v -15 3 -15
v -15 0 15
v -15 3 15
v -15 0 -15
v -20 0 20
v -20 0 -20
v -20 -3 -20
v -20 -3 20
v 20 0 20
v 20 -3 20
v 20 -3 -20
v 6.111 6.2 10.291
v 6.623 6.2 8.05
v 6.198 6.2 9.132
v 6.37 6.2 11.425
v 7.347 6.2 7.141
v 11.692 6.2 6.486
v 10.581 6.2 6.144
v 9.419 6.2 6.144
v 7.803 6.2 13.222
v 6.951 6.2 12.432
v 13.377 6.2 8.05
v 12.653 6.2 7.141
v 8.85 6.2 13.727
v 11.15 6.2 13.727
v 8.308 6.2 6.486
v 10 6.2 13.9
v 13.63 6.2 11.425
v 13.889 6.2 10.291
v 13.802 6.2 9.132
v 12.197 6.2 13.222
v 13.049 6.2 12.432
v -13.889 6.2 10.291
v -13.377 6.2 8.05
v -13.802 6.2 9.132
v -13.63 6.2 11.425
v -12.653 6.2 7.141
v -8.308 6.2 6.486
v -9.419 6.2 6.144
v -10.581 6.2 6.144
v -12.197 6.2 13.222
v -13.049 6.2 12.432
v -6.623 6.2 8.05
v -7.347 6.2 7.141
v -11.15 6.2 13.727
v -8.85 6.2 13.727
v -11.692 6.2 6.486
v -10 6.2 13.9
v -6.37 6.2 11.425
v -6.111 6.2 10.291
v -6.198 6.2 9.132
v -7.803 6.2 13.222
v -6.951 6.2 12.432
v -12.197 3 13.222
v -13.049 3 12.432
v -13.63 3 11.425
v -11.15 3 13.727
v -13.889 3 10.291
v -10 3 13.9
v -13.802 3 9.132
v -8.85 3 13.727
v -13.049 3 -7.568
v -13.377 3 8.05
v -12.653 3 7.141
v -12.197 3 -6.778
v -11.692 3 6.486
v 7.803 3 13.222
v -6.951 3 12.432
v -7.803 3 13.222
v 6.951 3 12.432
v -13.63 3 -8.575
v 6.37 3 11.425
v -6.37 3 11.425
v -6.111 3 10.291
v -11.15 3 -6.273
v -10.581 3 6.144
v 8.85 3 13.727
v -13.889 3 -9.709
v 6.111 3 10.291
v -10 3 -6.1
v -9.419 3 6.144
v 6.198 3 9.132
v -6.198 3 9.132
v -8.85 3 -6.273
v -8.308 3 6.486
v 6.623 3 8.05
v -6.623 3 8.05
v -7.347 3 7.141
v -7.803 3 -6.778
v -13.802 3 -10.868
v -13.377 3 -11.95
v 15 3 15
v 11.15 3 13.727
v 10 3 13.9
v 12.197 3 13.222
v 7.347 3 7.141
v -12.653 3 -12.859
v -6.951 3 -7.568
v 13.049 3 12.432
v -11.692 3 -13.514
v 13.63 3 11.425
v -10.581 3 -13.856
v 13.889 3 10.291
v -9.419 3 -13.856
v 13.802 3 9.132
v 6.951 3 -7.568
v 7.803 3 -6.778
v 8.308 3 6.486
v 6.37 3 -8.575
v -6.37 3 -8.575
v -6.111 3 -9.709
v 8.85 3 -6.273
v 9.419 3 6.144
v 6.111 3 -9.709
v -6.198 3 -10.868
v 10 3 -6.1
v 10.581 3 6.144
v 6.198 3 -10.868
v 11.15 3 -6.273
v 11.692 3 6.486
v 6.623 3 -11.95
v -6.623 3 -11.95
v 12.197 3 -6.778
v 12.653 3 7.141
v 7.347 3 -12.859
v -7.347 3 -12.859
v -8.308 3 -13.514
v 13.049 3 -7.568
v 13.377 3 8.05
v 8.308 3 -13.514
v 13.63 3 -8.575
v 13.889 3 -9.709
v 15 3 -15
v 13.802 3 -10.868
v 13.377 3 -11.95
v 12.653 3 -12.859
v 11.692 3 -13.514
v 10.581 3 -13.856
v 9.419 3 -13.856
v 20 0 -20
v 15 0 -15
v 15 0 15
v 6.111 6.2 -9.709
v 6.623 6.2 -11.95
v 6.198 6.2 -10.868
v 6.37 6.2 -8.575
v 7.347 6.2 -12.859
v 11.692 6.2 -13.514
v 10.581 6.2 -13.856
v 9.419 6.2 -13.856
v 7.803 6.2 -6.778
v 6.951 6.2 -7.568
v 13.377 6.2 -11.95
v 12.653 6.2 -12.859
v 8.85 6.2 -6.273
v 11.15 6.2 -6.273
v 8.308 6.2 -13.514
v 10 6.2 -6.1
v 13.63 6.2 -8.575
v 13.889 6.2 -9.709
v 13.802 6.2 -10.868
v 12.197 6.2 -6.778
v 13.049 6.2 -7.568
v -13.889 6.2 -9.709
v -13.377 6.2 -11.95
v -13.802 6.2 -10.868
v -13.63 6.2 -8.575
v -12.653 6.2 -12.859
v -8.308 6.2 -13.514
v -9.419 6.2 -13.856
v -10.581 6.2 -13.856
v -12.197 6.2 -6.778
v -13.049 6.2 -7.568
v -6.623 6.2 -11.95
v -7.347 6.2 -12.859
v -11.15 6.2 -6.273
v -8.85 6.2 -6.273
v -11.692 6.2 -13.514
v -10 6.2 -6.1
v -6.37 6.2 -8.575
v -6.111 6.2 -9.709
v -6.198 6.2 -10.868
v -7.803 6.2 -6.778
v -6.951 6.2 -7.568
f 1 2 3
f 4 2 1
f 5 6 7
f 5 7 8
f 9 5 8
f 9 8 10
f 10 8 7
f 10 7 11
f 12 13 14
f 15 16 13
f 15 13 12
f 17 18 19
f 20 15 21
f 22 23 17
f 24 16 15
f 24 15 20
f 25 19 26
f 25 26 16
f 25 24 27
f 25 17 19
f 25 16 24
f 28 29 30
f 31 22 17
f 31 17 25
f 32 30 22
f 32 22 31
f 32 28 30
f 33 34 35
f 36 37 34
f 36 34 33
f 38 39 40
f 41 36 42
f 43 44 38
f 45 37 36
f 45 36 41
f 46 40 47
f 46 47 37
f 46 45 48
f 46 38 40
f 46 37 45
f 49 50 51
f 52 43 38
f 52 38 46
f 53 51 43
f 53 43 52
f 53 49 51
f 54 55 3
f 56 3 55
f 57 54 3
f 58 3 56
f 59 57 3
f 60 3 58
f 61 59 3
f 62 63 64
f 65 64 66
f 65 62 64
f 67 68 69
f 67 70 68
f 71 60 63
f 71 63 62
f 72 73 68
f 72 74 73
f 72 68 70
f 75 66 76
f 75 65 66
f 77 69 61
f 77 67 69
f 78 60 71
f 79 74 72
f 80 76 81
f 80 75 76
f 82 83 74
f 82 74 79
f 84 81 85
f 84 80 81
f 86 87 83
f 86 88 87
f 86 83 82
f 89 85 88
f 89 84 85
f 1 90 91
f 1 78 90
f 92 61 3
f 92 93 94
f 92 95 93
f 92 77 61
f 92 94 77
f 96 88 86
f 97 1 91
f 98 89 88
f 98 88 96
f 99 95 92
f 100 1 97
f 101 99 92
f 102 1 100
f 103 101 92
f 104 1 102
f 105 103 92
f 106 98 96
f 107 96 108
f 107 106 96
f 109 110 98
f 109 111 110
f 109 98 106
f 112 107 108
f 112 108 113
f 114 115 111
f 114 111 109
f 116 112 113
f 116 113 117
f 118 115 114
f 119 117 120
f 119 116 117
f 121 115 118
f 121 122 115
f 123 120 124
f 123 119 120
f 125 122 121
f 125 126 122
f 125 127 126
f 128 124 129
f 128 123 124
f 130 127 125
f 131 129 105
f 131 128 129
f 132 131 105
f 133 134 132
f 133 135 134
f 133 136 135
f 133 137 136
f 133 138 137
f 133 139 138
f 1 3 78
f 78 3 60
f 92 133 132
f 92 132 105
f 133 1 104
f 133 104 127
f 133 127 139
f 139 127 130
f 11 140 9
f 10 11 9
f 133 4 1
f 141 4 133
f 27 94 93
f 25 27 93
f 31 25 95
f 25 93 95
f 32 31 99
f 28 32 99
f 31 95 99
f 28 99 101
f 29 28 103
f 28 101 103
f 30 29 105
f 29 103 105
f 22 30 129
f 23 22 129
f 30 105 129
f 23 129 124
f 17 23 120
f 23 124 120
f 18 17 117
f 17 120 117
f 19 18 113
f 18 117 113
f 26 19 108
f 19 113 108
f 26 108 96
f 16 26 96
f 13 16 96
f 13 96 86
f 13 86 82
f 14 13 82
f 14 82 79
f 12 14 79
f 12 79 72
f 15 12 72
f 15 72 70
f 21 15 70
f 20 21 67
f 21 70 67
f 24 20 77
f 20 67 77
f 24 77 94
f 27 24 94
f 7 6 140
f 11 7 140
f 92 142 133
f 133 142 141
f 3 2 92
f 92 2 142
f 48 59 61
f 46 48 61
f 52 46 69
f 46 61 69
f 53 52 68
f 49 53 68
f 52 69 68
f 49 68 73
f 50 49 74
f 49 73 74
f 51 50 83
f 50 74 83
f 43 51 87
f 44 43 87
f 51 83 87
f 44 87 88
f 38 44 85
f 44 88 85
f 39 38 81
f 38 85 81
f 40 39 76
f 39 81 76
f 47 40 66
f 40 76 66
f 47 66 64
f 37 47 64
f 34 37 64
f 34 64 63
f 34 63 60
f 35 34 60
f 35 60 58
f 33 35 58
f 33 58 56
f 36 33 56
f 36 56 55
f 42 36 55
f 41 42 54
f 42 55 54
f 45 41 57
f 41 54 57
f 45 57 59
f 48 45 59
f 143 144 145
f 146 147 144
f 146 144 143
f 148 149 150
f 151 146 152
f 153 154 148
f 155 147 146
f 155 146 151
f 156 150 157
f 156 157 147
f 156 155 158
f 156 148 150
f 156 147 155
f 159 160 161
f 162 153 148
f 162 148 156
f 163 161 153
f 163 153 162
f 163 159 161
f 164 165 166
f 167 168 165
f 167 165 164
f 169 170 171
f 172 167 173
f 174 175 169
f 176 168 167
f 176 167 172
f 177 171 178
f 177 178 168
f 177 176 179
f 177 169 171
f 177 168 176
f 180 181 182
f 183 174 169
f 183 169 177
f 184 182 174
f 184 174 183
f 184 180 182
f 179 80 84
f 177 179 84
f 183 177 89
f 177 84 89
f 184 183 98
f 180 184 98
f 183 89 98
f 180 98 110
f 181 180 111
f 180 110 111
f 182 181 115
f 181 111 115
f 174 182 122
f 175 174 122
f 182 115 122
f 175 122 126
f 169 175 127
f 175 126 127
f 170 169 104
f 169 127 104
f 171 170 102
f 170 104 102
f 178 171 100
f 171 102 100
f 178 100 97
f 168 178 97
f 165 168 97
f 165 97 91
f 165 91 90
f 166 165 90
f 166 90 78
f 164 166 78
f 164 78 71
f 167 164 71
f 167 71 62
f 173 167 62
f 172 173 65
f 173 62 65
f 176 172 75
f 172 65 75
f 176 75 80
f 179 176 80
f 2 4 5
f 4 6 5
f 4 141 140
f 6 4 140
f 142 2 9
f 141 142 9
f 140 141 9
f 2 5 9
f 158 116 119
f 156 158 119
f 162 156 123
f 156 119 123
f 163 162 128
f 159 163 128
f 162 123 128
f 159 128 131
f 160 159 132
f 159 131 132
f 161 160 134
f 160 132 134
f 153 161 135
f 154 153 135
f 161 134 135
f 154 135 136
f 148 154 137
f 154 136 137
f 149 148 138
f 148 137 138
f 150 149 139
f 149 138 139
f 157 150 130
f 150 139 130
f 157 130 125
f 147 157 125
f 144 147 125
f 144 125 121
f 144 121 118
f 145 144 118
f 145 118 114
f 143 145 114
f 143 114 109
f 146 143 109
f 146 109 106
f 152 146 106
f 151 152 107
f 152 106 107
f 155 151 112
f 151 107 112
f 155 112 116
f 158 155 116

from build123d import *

# Parameters (mm, degrees)
SKETCH1_W           = 30
SKETCH1_H           = 30
SKETCH1_R           = 3.9
BOSS_EXTRUDE1_DEPTH = 3
SKETCH2_R           = 3.9
BOSS_EXTRUDE2_DEPTH = 3.2
SKETCH3_W           = 40
SKETCH3_H           = 40
BOSS_EXTRUDE3_DEPTH = 3


with BuildPart() as part:
    # Sketch1 → Boss-Extrude1 (new body)
    # profile 1 of 5: a face of its own
    with BuildSketch(Plane(origin=(0, 0, 0), x_dir=(1, 0, 0), z_dir=(0, 1, 0))):
        Rectangle(SKETCH1_W, SKETCH1_H)
        with Locations((10, -10)):
            Circle(SKETCH1_R, mode=Mode.SUBTRACT)
        with Locations((-10, -10)):
            Circle(SKETCH1_R, mode=Mode.SUBTRACT)
        with Locations((10, 10)):
            Circle(SKETCH1_R, mode=Mode.SUBTRACT)
        with Locations((-10, 10)):
            Circle(SKETCH1_R, mode=Mode.SUBTRACT)
    # profile 2 of 5: a face of its own
    with BuildSketch(Plane(origin=(0, 0, 0), x_dir=(1, 0, 0), z_dir=(0, 1, 0))):
        with Locations((-10, 10)):
            Circle(SKETCH1_R)
    # profile 3 of 5: a face of its own
    with BuildSketch(Plane(origin=(0, 0, 0), x_dir=(1, 0, 0), z_dir=(0, 1, 0))):
        with Locations((10, 10)):
            Circle(SKETCH1_R)
    # profile 4 of 5: a face of its own
    with BuildSketch(Plane(origin=(0, 0, 0), x_dir=(1, 0, 0), z_dir=(0, 1, 0))):
        with Locations((-10, -10)):
            Circle(SKETCH1_R)
    # profile 5 of 5: a face of its own
    with BuildSketch(Plane(origin=(0, 0, 0), x_dir=(1, 0, 0), z_dir=(0, 1, 0))):
        with Locations((10, -10)):
            Circle(SKETCH1_R)
    extrude(amount=BOSS_EXTRUDE1_DEPTH)

    # Sketch2 → Boss-Extrude2 (add)
    with BuildSketch(Plane(origin=(0, 3, 0), x_dir=(1, 0, 0), z_dir=(0, 1, 0))):
        with Locations(Location((-10, -10, 0), (0, 0, 270))):
            Circle(SKETCH2_R)
        with Locations(Location((10, -10, 0), (0, 0, 270))):
            Circle(SKETCH2_R)
        with Locations(Location((10, 10, 0), (0, 0, 270))):
            Circle(SKETCH2_R)
        with Locations(Location((-10, 10, 0), (0, 0, 270))):
            Circle(SKETCH2_R)
    extrude(amount=BOSS_EXTRUDE2_DEPTH)

    # Sketch3 → Boss-Extrude3 (add)
    with BuildSketch(Plane.XZ):
        Rectangle(SKETCH3_W, SKETCH3_H)
    extrude(amount=BOSS_EXTRUDE3_DEPTH)


solid = part.part
